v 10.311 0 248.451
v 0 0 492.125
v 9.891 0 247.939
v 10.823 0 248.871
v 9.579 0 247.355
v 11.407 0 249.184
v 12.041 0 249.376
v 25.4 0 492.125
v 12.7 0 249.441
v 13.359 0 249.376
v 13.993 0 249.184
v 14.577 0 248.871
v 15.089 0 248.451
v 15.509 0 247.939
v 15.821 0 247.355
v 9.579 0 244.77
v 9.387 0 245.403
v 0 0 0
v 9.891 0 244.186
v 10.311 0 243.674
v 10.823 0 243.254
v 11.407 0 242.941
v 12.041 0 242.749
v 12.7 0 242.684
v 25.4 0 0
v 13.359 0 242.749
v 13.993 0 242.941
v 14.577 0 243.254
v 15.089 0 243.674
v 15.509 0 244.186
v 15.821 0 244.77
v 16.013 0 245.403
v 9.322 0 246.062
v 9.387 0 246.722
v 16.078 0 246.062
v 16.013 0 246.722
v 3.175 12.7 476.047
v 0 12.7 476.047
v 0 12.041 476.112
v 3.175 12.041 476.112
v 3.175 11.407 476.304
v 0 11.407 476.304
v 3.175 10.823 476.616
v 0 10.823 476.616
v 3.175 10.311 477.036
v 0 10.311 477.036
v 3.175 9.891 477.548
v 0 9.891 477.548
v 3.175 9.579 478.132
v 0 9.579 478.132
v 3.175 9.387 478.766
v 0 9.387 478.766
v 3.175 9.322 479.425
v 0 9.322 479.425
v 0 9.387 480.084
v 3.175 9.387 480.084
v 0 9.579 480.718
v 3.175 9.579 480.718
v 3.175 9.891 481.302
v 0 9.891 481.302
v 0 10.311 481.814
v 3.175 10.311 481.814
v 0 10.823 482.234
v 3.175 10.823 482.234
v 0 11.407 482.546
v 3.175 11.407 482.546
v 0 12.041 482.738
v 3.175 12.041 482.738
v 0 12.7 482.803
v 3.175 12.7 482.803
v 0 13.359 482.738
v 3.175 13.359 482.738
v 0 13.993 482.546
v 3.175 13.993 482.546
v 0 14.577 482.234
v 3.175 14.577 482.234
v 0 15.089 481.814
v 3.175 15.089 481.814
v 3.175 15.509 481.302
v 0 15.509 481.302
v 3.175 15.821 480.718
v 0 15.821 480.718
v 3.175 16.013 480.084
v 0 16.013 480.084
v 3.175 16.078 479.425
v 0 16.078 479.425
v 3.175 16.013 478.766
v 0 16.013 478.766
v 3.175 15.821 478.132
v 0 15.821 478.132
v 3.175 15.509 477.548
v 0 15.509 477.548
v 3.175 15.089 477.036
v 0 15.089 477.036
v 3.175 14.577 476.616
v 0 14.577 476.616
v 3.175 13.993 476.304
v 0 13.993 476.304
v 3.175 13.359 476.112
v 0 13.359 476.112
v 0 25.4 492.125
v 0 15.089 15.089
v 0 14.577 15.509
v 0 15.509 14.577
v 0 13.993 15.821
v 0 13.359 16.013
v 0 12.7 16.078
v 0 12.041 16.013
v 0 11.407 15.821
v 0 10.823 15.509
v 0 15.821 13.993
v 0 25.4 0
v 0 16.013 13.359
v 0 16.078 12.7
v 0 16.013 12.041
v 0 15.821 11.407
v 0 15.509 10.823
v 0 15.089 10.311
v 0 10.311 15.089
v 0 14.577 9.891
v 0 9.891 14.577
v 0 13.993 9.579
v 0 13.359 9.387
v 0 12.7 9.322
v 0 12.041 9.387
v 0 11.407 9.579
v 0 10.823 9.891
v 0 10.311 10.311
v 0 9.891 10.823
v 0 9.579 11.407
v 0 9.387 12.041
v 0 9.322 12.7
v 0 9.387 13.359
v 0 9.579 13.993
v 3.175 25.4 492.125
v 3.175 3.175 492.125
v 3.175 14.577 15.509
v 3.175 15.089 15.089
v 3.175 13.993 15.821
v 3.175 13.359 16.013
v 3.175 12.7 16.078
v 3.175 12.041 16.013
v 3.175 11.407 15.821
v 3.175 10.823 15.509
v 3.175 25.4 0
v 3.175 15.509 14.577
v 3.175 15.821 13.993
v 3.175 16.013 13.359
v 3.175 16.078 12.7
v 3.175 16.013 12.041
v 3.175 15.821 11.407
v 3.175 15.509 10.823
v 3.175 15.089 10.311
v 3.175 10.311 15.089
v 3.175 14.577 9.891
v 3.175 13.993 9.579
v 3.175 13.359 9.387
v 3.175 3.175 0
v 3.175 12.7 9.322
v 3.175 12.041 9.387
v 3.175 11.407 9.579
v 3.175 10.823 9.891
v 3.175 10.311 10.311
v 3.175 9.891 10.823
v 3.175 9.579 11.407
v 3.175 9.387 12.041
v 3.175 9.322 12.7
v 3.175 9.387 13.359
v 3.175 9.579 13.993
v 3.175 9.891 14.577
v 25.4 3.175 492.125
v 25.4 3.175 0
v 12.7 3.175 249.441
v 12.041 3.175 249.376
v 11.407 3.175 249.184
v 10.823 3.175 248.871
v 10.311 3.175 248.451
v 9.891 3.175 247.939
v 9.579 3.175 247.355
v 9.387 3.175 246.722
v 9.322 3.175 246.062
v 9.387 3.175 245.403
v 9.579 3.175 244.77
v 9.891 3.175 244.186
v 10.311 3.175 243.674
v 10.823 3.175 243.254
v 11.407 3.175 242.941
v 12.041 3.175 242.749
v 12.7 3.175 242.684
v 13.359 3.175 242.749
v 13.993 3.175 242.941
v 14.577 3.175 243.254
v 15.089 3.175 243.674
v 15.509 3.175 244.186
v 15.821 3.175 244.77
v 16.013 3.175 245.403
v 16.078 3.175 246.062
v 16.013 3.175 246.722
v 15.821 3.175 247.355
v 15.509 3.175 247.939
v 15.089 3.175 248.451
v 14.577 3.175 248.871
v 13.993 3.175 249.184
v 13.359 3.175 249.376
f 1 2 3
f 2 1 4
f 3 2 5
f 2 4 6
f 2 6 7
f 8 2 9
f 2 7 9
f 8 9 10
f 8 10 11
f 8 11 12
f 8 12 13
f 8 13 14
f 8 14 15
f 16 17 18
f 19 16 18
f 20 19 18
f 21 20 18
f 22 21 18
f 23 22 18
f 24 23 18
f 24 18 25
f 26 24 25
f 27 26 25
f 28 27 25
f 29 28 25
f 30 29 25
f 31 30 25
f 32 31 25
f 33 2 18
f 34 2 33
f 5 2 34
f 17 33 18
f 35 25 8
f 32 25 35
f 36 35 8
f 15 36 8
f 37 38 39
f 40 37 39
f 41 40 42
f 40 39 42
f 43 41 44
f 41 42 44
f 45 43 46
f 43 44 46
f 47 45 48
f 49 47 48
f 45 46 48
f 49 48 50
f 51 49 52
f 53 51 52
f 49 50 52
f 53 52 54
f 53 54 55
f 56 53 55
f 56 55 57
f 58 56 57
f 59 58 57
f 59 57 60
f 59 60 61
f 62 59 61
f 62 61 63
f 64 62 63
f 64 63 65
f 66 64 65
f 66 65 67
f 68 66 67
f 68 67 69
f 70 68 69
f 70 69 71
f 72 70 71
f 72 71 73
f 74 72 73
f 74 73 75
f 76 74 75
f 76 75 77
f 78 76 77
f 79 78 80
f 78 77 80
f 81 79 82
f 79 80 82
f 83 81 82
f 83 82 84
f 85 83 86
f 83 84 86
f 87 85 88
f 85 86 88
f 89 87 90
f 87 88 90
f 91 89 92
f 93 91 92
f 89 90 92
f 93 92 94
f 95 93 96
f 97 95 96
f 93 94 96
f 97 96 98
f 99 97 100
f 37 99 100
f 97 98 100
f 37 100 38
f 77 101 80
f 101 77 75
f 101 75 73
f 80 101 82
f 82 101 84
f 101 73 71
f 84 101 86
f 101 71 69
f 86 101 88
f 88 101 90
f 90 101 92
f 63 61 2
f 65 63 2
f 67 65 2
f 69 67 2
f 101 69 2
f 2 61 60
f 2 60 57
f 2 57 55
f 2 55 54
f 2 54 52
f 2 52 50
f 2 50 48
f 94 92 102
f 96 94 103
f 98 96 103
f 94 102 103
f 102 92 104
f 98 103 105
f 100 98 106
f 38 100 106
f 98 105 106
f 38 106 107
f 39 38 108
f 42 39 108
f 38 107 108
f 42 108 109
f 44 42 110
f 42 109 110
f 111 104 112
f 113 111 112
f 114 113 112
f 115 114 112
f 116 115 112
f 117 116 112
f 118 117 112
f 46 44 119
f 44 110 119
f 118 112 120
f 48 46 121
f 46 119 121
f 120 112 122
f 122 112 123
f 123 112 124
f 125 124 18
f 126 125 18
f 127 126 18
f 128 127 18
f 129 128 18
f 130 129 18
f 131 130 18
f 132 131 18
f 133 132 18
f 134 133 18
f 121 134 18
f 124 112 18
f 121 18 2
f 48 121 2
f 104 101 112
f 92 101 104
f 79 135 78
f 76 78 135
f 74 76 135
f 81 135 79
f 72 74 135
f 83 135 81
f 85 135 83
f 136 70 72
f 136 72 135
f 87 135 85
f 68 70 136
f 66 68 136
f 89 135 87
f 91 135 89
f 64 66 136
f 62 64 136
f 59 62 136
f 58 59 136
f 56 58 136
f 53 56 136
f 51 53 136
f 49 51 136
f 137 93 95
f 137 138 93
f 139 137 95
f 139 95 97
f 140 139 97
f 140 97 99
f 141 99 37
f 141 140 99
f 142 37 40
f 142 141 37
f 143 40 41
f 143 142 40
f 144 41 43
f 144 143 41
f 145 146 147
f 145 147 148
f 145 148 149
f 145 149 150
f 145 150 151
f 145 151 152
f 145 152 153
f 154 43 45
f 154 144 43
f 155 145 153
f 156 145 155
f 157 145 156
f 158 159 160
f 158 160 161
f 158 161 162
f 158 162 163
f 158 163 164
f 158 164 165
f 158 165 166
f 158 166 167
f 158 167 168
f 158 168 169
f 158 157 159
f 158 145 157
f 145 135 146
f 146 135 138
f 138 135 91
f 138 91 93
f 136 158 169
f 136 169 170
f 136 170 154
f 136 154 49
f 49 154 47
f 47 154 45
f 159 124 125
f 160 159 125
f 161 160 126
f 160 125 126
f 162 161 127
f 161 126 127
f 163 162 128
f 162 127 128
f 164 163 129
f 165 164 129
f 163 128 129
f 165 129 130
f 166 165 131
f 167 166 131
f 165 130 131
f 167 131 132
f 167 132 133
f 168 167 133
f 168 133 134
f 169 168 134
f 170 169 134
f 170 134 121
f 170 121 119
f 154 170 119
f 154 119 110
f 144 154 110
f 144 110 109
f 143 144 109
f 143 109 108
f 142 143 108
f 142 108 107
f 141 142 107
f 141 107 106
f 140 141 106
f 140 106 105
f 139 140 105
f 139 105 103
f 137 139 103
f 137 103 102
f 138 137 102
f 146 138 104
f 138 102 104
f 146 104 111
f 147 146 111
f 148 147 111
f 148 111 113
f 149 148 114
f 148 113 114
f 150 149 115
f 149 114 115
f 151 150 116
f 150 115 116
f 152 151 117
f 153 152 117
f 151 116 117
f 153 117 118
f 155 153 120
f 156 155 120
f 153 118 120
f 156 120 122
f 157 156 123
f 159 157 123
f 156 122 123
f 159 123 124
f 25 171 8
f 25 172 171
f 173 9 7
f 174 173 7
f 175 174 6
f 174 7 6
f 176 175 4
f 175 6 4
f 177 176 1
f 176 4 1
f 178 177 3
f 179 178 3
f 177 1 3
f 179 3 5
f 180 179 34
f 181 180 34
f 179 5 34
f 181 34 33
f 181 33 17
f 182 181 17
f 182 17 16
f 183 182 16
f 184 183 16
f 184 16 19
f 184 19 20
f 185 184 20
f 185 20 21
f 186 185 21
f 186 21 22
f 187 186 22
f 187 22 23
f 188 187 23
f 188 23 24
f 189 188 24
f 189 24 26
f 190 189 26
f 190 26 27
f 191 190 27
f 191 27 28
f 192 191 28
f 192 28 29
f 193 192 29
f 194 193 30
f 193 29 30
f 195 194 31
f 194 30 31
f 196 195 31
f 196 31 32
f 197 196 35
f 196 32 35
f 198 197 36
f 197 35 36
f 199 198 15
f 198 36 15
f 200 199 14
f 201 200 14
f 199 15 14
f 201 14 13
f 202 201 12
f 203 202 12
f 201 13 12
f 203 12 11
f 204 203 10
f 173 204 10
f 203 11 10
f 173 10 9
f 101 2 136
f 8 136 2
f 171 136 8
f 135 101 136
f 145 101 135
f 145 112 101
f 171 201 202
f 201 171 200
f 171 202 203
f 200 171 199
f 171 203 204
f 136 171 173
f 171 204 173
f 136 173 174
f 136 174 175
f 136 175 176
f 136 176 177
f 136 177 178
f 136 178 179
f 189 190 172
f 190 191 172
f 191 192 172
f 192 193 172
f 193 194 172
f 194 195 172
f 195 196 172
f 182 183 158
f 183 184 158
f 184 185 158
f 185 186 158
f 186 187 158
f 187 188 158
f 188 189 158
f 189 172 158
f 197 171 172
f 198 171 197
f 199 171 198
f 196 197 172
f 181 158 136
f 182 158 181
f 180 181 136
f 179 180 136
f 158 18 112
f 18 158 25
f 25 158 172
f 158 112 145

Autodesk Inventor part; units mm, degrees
ref_plane "YZ Plane" through (0, 0, 0) normal (1, 0, 0) x (0, 1, 0)
ref_plane "XZ Plane" through (0, 0, 0) normal (0, 1, 0) x (-1, 0, 0)
ref_plane "XY Plane" through (0, 0, 0) normal (0, 0, 1) x (1, 0, 0)
sketch "Sketch1" plane through (0, 0, 0) normal (0, 0, 1) x (1, 0, 0)
  line L0 (0, 25.4) -> (0, 0)
  line L1 (0, 0) -> (25.4, 0)
  line L2 (3.175, 25.4) -> (3.175, 4.953)
  line L3 (4.953, 3.175) -> (25.4, 3.175)
  line L4 (0, 25.4) -> (3.175, 25.4)
  line L5 (25.4, 3.175) -> (25.4, 0)
  line L6 (3.175, 4.953) -> (3.175, 3.175)
  line L7 (4.953, 3.175) -> (3.175, 3.175)
  dimension "d0" = 25.4
  dimension "d1" = 25.4
  dimension "d2" = 3.175
extrude "Extrusion1" add sketch "Sketch1" along normal blind 492.125
sketch "Sketch7" plane through (3.175, 3.175, 0) normal (1, 0, 0) x (0, 0, -1)
  circle A0 centre (-479.425, 9.525) radius 2.8124
  line L0 (0, 22.225) -> (-492.125, 22.225) projected
  line L1 (-492.125, 0) -> (-492.125, 22.225) projected
  circle A1 centre (-12.7, 9.525) radius 2.8124
  point P0 (0, -3.175)
  dimension "d43" = 12.7
  dimension "d44" = 12.7
  dimension "d47" = 466.725
hole "mount" at (3.175, 12.7, 479.425) at (3.175, 12.7, 12.7) direction (-1, 0, 0) diameter 6.7564 depth 25.4 tip angle 118 clearance for "Flat Head Machine Screw (82)" size "1/4" standard "Ansi Unified Screw Threads"
sketch "Sketch8" plane through (3.175, 3.175, 0) normal (0, 1, 0) x (1, 0, 0)
  line L0 (-3.175, -492.125) -> (22.225, -492.125) projected
  line L1 (9.525, -492.125) -> (9.525, 0) construction
  line L2 (22.225, 0) -> (22.225, -492.125) projected
  circle A0 centre (9.525, -246.0625) radius 4.5971
  point P0 (-3.175, 0)
  dimension "d59" = 12.7
hole "Hole5" at (12.7, 3.175, 246.0625) direction (0, -1, 0) diameter 6.7564 depth 25.4 tip angle 118 clearance for "Flat Head Machine Screw (82)" size "1/4" standard "Ansi Unified Screw Threads"
properties part number "angle_L104"
